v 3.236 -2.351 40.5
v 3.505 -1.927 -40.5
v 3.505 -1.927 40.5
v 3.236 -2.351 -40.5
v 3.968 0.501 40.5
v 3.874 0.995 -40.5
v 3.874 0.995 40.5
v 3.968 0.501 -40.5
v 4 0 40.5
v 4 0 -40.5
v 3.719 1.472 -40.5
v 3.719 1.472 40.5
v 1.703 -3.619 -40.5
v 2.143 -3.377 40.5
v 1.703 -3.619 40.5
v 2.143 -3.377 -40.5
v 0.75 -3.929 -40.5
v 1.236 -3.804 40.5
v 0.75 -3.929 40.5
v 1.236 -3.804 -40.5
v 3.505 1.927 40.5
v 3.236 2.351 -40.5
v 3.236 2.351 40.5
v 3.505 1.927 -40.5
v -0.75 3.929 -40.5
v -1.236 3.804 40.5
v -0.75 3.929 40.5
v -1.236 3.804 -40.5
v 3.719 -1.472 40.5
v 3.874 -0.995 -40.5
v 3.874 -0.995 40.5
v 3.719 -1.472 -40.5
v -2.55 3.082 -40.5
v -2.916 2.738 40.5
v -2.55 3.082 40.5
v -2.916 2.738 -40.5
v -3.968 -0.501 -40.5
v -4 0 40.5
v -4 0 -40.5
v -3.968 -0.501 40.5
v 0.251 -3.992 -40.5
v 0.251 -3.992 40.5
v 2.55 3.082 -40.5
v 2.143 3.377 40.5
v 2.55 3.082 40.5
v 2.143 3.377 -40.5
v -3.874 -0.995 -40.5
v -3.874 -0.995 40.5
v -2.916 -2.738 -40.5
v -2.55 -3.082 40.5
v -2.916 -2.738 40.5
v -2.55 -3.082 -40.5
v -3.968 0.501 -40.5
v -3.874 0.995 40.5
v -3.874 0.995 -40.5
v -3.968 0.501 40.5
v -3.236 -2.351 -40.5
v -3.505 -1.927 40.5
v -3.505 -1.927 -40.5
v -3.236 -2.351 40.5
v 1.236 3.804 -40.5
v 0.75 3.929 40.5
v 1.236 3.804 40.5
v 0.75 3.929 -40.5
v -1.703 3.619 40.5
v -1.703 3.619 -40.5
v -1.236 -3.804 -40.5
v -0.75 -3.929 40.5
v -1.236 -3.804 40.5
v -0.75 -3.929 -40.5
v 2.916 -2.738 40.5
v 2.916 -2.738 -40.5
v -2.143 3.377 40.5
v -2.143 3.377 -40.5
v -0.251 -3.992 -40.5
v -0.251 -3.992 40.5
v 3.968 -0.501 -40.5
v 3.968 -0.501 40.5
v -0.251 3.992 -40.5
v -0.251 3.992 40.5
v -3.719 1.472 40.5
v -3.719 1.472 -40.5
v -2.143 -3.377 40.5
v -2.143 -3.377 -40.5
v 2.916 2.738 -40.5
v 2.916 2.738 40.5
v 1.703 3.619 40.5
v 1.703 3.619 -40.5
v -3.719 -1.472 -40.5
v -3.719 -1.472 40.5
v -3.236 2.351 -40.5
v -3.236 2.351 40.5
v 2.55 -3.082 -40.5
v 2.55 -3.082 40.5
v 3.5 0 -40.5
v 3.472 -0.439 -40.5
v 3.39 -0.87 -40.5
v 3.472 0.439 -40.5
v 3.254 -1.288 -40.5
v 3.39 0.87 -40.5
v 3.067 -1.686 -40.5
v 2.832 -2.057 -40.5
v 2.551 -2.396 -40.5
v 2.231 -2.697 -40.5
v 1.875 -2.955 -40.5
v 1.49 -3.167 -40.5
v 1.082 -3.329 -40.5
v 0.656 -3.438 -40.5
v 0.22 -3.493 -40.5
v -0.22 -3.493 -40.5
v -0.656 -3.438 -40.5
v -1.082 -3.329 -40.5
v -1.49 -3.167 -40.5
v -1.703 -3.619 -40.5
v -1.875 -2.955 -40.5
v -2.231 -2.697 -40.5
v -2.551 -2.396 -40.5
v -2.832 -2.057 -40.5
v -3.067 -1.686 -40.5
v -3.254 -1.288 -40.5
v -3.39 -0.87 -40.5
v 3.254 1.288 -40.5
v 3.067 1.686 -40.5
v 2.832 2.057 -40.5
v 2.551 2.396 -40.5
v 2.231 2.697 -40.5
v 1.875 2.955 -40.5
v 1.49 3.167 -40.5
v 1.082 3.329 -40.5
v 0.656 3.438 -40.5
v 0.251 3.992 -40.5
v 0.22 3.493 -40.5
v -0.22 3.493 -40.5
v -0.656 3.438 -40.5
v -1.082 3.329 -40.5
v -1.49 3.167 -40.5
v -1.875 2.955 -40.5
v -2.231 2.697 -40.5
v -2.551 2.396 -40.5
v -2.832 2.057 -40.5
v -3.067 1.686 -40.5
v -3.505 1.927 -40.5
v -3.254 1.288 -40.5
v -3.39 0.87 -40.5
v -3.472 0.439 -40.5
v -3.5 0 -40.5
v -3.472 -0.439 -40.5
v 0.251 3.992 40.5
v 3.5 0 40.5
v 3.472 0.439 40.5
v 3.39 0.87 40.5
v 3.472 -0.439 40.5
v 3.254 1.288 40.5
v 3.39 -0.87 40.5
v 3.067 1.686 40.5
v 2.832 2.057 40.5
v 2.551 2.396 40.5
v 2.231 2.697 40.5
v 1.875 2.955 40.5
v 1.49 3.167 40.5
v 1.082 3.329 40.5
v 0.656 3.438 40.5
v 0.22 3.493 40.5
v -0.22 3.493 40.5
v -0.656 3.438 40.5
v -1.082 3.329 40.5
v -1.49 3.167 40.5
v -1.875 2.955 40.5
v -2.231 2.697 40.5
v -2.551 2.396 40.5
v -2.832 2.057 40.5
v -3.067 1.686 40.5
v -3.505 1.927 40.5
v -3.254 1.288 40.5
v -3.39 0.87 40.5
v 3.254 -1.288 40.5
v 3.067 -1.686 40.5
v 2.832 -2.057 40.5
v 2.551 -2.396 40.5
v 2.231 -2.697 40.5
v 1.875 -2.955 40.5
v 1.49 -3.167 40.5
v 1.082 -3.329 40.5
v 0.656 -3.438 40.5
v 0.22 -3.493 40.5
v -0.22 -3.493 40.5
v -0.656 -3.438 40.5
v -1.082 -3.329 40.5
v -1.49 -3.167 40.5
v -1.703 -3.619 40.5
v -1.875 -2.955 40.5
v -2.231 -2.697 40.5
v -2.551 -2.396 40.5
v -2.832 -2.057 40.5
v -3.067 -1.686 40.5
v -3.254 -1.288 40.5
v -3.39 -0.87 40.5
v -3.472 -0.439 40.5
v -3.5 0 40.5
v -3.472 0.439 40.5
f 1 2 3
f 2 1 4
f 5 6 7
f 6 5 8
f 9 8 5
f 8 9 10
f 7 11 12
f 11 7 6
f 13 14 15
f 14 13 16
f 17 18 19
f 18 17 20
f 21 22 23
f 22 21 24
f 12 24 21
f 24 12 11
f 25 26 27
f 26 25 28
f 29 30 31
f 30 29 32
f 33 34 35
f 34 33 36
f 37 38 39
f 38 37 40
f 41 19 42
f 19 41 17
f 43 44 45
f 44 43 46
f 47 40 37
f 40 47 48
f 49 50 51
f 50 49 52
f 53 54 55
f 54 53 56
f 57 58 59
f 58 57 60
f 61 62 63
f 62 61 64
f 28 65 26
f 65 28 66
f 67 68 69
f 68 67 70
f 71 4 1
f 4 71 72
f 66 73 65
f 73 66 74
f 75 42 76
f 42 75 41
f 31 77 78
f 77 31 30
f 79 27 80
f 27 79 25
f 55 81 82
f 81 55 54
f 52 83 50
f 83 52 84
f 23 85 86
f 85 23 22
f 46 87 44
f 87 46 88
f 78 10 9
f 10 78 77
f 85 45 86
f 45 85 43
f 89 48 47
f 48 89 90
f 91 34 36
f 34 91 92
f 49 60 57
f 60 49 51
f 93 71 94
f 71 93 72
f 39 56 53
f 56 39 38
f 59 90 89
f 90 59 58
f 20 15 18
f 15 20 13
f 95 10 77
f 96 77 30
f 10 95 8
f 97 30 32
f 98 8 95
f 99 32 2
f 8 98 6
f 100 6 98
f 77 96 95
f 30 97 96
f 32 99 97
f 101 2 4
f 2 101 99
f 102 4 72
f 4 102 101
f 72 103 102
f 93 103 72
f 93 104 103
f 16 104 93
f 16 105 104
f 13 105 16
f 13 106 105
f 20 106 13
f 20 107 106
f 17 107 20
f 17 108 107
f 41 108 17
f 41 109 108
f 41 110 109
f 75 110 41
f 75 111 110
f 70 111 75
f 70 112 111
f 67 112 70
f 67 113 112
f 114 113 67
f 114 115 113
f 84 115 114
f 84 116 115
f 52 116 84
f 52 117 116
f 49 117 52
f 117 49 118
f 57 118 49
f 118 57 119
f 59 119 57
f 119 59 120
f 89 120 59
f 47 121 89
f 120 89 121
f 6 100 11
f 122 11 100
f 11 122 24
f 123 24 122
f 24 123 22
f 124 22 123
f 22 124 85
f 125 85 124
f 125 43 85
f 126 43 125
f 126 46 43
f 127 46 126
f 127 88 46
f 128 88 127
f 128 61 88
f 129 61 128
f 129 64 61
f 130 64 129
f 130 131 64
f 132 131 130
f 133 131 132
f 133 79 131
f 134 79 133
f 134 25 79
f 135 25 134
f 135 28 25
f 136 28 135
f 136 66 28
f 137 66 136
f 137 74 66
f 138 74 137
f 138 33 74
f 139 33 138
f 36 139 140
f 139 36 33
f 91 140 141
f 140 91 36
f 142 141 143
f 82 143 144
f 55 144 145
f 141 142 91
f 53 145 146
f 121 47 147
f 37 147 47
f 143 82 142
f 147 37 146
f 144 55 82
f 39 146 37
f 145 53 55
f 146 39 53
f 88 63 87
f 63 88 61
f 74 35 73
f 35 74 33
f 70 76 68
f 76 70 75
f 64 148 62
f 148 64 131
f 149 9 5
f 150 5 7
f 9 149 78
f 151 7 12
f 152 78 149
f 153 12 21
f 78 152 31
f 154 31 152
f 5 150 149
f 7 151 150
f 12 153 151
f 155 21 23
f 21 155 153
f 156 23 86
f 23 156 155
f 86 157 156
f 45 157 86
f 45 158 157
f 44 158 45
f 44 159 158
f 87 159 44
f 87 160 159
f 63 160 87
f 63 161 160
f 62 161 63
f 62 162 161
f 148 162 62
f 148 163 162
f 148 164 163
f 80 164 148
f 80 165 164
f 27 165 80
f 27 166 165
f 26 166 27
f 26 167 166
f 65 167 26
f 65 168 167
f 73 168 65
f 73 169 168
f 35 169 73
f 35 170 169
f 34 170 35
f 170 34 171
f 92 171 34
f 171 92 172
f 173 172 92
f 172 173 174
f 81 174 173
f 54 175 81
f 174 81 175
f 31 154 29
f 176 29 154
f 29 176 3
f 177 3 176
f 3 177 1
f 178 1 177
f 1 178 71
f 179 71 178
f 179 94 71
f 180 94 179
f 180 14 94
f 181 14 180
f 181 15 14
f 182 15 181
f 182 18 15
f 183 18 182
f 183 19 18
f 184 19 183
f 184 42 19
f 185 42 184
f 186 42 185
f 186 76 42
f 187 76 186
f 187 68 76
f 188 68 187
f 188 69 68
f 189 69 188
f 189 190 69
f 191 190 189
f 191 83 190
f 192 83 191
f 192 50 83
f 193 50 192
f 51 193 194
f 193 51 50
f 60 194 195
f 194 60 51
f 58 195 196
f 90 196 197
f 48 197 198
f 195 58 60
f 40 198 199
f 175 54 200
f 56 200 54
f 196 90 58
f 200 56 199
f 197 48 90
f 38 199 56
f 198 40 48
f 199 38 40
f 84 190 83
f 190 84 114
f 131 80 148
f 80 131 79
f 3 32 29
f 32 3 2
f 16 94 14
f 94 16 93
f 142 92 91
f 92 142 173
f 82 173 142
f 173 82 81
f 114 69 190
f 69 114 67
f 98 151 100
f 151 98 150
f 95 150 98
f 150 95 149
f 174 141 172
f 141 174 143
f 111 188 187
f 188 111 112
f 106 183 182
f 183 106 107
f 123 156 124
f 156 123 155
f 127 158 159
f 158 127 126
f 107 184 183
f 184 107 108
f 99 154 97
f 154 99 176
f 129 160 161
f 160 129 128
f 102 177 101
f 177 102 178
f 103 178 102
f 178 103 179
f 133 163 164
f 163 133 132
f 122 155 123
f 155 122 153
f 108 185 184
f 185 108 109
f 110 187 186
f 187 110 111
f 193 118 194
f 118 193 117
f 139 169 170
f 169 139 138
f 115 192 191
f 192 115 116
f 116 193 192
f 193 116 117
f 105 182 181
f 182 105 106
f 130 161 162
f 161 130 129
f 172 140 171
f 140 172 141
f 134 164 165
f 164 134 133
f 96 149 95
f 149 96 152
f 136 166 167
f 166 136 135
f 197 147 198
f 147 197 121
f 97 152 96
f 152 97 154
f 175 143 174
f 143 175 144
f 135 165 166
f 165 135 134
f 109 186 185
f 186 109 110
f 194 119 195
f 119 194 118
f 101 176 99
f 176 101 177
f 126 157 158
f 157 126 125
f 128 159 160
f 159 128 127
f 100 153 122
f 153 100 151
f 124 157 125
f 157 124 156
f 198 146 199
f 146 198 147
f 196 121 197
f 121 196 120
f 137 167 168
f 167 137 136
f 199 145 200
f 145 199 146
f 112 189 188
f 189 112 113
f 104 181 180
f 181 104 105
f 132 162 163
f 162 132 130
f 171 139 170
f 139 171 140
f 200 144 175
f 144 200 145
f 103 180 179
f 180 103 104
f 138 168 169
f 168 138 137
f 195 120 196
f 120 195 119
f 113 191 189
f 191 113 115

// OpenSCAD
$fn = 50;


difference() {
	union() {
		translate(v = [0, 0, -40.5000000000]) {
			cylinder(h = 81, r = 4.0000000000);
		}
	}
	union() {
		translate(v = [0, 0, -100.0000000000]) {
			cylinder(h = 200, r = 3.5000000000);
		}
	}
}
